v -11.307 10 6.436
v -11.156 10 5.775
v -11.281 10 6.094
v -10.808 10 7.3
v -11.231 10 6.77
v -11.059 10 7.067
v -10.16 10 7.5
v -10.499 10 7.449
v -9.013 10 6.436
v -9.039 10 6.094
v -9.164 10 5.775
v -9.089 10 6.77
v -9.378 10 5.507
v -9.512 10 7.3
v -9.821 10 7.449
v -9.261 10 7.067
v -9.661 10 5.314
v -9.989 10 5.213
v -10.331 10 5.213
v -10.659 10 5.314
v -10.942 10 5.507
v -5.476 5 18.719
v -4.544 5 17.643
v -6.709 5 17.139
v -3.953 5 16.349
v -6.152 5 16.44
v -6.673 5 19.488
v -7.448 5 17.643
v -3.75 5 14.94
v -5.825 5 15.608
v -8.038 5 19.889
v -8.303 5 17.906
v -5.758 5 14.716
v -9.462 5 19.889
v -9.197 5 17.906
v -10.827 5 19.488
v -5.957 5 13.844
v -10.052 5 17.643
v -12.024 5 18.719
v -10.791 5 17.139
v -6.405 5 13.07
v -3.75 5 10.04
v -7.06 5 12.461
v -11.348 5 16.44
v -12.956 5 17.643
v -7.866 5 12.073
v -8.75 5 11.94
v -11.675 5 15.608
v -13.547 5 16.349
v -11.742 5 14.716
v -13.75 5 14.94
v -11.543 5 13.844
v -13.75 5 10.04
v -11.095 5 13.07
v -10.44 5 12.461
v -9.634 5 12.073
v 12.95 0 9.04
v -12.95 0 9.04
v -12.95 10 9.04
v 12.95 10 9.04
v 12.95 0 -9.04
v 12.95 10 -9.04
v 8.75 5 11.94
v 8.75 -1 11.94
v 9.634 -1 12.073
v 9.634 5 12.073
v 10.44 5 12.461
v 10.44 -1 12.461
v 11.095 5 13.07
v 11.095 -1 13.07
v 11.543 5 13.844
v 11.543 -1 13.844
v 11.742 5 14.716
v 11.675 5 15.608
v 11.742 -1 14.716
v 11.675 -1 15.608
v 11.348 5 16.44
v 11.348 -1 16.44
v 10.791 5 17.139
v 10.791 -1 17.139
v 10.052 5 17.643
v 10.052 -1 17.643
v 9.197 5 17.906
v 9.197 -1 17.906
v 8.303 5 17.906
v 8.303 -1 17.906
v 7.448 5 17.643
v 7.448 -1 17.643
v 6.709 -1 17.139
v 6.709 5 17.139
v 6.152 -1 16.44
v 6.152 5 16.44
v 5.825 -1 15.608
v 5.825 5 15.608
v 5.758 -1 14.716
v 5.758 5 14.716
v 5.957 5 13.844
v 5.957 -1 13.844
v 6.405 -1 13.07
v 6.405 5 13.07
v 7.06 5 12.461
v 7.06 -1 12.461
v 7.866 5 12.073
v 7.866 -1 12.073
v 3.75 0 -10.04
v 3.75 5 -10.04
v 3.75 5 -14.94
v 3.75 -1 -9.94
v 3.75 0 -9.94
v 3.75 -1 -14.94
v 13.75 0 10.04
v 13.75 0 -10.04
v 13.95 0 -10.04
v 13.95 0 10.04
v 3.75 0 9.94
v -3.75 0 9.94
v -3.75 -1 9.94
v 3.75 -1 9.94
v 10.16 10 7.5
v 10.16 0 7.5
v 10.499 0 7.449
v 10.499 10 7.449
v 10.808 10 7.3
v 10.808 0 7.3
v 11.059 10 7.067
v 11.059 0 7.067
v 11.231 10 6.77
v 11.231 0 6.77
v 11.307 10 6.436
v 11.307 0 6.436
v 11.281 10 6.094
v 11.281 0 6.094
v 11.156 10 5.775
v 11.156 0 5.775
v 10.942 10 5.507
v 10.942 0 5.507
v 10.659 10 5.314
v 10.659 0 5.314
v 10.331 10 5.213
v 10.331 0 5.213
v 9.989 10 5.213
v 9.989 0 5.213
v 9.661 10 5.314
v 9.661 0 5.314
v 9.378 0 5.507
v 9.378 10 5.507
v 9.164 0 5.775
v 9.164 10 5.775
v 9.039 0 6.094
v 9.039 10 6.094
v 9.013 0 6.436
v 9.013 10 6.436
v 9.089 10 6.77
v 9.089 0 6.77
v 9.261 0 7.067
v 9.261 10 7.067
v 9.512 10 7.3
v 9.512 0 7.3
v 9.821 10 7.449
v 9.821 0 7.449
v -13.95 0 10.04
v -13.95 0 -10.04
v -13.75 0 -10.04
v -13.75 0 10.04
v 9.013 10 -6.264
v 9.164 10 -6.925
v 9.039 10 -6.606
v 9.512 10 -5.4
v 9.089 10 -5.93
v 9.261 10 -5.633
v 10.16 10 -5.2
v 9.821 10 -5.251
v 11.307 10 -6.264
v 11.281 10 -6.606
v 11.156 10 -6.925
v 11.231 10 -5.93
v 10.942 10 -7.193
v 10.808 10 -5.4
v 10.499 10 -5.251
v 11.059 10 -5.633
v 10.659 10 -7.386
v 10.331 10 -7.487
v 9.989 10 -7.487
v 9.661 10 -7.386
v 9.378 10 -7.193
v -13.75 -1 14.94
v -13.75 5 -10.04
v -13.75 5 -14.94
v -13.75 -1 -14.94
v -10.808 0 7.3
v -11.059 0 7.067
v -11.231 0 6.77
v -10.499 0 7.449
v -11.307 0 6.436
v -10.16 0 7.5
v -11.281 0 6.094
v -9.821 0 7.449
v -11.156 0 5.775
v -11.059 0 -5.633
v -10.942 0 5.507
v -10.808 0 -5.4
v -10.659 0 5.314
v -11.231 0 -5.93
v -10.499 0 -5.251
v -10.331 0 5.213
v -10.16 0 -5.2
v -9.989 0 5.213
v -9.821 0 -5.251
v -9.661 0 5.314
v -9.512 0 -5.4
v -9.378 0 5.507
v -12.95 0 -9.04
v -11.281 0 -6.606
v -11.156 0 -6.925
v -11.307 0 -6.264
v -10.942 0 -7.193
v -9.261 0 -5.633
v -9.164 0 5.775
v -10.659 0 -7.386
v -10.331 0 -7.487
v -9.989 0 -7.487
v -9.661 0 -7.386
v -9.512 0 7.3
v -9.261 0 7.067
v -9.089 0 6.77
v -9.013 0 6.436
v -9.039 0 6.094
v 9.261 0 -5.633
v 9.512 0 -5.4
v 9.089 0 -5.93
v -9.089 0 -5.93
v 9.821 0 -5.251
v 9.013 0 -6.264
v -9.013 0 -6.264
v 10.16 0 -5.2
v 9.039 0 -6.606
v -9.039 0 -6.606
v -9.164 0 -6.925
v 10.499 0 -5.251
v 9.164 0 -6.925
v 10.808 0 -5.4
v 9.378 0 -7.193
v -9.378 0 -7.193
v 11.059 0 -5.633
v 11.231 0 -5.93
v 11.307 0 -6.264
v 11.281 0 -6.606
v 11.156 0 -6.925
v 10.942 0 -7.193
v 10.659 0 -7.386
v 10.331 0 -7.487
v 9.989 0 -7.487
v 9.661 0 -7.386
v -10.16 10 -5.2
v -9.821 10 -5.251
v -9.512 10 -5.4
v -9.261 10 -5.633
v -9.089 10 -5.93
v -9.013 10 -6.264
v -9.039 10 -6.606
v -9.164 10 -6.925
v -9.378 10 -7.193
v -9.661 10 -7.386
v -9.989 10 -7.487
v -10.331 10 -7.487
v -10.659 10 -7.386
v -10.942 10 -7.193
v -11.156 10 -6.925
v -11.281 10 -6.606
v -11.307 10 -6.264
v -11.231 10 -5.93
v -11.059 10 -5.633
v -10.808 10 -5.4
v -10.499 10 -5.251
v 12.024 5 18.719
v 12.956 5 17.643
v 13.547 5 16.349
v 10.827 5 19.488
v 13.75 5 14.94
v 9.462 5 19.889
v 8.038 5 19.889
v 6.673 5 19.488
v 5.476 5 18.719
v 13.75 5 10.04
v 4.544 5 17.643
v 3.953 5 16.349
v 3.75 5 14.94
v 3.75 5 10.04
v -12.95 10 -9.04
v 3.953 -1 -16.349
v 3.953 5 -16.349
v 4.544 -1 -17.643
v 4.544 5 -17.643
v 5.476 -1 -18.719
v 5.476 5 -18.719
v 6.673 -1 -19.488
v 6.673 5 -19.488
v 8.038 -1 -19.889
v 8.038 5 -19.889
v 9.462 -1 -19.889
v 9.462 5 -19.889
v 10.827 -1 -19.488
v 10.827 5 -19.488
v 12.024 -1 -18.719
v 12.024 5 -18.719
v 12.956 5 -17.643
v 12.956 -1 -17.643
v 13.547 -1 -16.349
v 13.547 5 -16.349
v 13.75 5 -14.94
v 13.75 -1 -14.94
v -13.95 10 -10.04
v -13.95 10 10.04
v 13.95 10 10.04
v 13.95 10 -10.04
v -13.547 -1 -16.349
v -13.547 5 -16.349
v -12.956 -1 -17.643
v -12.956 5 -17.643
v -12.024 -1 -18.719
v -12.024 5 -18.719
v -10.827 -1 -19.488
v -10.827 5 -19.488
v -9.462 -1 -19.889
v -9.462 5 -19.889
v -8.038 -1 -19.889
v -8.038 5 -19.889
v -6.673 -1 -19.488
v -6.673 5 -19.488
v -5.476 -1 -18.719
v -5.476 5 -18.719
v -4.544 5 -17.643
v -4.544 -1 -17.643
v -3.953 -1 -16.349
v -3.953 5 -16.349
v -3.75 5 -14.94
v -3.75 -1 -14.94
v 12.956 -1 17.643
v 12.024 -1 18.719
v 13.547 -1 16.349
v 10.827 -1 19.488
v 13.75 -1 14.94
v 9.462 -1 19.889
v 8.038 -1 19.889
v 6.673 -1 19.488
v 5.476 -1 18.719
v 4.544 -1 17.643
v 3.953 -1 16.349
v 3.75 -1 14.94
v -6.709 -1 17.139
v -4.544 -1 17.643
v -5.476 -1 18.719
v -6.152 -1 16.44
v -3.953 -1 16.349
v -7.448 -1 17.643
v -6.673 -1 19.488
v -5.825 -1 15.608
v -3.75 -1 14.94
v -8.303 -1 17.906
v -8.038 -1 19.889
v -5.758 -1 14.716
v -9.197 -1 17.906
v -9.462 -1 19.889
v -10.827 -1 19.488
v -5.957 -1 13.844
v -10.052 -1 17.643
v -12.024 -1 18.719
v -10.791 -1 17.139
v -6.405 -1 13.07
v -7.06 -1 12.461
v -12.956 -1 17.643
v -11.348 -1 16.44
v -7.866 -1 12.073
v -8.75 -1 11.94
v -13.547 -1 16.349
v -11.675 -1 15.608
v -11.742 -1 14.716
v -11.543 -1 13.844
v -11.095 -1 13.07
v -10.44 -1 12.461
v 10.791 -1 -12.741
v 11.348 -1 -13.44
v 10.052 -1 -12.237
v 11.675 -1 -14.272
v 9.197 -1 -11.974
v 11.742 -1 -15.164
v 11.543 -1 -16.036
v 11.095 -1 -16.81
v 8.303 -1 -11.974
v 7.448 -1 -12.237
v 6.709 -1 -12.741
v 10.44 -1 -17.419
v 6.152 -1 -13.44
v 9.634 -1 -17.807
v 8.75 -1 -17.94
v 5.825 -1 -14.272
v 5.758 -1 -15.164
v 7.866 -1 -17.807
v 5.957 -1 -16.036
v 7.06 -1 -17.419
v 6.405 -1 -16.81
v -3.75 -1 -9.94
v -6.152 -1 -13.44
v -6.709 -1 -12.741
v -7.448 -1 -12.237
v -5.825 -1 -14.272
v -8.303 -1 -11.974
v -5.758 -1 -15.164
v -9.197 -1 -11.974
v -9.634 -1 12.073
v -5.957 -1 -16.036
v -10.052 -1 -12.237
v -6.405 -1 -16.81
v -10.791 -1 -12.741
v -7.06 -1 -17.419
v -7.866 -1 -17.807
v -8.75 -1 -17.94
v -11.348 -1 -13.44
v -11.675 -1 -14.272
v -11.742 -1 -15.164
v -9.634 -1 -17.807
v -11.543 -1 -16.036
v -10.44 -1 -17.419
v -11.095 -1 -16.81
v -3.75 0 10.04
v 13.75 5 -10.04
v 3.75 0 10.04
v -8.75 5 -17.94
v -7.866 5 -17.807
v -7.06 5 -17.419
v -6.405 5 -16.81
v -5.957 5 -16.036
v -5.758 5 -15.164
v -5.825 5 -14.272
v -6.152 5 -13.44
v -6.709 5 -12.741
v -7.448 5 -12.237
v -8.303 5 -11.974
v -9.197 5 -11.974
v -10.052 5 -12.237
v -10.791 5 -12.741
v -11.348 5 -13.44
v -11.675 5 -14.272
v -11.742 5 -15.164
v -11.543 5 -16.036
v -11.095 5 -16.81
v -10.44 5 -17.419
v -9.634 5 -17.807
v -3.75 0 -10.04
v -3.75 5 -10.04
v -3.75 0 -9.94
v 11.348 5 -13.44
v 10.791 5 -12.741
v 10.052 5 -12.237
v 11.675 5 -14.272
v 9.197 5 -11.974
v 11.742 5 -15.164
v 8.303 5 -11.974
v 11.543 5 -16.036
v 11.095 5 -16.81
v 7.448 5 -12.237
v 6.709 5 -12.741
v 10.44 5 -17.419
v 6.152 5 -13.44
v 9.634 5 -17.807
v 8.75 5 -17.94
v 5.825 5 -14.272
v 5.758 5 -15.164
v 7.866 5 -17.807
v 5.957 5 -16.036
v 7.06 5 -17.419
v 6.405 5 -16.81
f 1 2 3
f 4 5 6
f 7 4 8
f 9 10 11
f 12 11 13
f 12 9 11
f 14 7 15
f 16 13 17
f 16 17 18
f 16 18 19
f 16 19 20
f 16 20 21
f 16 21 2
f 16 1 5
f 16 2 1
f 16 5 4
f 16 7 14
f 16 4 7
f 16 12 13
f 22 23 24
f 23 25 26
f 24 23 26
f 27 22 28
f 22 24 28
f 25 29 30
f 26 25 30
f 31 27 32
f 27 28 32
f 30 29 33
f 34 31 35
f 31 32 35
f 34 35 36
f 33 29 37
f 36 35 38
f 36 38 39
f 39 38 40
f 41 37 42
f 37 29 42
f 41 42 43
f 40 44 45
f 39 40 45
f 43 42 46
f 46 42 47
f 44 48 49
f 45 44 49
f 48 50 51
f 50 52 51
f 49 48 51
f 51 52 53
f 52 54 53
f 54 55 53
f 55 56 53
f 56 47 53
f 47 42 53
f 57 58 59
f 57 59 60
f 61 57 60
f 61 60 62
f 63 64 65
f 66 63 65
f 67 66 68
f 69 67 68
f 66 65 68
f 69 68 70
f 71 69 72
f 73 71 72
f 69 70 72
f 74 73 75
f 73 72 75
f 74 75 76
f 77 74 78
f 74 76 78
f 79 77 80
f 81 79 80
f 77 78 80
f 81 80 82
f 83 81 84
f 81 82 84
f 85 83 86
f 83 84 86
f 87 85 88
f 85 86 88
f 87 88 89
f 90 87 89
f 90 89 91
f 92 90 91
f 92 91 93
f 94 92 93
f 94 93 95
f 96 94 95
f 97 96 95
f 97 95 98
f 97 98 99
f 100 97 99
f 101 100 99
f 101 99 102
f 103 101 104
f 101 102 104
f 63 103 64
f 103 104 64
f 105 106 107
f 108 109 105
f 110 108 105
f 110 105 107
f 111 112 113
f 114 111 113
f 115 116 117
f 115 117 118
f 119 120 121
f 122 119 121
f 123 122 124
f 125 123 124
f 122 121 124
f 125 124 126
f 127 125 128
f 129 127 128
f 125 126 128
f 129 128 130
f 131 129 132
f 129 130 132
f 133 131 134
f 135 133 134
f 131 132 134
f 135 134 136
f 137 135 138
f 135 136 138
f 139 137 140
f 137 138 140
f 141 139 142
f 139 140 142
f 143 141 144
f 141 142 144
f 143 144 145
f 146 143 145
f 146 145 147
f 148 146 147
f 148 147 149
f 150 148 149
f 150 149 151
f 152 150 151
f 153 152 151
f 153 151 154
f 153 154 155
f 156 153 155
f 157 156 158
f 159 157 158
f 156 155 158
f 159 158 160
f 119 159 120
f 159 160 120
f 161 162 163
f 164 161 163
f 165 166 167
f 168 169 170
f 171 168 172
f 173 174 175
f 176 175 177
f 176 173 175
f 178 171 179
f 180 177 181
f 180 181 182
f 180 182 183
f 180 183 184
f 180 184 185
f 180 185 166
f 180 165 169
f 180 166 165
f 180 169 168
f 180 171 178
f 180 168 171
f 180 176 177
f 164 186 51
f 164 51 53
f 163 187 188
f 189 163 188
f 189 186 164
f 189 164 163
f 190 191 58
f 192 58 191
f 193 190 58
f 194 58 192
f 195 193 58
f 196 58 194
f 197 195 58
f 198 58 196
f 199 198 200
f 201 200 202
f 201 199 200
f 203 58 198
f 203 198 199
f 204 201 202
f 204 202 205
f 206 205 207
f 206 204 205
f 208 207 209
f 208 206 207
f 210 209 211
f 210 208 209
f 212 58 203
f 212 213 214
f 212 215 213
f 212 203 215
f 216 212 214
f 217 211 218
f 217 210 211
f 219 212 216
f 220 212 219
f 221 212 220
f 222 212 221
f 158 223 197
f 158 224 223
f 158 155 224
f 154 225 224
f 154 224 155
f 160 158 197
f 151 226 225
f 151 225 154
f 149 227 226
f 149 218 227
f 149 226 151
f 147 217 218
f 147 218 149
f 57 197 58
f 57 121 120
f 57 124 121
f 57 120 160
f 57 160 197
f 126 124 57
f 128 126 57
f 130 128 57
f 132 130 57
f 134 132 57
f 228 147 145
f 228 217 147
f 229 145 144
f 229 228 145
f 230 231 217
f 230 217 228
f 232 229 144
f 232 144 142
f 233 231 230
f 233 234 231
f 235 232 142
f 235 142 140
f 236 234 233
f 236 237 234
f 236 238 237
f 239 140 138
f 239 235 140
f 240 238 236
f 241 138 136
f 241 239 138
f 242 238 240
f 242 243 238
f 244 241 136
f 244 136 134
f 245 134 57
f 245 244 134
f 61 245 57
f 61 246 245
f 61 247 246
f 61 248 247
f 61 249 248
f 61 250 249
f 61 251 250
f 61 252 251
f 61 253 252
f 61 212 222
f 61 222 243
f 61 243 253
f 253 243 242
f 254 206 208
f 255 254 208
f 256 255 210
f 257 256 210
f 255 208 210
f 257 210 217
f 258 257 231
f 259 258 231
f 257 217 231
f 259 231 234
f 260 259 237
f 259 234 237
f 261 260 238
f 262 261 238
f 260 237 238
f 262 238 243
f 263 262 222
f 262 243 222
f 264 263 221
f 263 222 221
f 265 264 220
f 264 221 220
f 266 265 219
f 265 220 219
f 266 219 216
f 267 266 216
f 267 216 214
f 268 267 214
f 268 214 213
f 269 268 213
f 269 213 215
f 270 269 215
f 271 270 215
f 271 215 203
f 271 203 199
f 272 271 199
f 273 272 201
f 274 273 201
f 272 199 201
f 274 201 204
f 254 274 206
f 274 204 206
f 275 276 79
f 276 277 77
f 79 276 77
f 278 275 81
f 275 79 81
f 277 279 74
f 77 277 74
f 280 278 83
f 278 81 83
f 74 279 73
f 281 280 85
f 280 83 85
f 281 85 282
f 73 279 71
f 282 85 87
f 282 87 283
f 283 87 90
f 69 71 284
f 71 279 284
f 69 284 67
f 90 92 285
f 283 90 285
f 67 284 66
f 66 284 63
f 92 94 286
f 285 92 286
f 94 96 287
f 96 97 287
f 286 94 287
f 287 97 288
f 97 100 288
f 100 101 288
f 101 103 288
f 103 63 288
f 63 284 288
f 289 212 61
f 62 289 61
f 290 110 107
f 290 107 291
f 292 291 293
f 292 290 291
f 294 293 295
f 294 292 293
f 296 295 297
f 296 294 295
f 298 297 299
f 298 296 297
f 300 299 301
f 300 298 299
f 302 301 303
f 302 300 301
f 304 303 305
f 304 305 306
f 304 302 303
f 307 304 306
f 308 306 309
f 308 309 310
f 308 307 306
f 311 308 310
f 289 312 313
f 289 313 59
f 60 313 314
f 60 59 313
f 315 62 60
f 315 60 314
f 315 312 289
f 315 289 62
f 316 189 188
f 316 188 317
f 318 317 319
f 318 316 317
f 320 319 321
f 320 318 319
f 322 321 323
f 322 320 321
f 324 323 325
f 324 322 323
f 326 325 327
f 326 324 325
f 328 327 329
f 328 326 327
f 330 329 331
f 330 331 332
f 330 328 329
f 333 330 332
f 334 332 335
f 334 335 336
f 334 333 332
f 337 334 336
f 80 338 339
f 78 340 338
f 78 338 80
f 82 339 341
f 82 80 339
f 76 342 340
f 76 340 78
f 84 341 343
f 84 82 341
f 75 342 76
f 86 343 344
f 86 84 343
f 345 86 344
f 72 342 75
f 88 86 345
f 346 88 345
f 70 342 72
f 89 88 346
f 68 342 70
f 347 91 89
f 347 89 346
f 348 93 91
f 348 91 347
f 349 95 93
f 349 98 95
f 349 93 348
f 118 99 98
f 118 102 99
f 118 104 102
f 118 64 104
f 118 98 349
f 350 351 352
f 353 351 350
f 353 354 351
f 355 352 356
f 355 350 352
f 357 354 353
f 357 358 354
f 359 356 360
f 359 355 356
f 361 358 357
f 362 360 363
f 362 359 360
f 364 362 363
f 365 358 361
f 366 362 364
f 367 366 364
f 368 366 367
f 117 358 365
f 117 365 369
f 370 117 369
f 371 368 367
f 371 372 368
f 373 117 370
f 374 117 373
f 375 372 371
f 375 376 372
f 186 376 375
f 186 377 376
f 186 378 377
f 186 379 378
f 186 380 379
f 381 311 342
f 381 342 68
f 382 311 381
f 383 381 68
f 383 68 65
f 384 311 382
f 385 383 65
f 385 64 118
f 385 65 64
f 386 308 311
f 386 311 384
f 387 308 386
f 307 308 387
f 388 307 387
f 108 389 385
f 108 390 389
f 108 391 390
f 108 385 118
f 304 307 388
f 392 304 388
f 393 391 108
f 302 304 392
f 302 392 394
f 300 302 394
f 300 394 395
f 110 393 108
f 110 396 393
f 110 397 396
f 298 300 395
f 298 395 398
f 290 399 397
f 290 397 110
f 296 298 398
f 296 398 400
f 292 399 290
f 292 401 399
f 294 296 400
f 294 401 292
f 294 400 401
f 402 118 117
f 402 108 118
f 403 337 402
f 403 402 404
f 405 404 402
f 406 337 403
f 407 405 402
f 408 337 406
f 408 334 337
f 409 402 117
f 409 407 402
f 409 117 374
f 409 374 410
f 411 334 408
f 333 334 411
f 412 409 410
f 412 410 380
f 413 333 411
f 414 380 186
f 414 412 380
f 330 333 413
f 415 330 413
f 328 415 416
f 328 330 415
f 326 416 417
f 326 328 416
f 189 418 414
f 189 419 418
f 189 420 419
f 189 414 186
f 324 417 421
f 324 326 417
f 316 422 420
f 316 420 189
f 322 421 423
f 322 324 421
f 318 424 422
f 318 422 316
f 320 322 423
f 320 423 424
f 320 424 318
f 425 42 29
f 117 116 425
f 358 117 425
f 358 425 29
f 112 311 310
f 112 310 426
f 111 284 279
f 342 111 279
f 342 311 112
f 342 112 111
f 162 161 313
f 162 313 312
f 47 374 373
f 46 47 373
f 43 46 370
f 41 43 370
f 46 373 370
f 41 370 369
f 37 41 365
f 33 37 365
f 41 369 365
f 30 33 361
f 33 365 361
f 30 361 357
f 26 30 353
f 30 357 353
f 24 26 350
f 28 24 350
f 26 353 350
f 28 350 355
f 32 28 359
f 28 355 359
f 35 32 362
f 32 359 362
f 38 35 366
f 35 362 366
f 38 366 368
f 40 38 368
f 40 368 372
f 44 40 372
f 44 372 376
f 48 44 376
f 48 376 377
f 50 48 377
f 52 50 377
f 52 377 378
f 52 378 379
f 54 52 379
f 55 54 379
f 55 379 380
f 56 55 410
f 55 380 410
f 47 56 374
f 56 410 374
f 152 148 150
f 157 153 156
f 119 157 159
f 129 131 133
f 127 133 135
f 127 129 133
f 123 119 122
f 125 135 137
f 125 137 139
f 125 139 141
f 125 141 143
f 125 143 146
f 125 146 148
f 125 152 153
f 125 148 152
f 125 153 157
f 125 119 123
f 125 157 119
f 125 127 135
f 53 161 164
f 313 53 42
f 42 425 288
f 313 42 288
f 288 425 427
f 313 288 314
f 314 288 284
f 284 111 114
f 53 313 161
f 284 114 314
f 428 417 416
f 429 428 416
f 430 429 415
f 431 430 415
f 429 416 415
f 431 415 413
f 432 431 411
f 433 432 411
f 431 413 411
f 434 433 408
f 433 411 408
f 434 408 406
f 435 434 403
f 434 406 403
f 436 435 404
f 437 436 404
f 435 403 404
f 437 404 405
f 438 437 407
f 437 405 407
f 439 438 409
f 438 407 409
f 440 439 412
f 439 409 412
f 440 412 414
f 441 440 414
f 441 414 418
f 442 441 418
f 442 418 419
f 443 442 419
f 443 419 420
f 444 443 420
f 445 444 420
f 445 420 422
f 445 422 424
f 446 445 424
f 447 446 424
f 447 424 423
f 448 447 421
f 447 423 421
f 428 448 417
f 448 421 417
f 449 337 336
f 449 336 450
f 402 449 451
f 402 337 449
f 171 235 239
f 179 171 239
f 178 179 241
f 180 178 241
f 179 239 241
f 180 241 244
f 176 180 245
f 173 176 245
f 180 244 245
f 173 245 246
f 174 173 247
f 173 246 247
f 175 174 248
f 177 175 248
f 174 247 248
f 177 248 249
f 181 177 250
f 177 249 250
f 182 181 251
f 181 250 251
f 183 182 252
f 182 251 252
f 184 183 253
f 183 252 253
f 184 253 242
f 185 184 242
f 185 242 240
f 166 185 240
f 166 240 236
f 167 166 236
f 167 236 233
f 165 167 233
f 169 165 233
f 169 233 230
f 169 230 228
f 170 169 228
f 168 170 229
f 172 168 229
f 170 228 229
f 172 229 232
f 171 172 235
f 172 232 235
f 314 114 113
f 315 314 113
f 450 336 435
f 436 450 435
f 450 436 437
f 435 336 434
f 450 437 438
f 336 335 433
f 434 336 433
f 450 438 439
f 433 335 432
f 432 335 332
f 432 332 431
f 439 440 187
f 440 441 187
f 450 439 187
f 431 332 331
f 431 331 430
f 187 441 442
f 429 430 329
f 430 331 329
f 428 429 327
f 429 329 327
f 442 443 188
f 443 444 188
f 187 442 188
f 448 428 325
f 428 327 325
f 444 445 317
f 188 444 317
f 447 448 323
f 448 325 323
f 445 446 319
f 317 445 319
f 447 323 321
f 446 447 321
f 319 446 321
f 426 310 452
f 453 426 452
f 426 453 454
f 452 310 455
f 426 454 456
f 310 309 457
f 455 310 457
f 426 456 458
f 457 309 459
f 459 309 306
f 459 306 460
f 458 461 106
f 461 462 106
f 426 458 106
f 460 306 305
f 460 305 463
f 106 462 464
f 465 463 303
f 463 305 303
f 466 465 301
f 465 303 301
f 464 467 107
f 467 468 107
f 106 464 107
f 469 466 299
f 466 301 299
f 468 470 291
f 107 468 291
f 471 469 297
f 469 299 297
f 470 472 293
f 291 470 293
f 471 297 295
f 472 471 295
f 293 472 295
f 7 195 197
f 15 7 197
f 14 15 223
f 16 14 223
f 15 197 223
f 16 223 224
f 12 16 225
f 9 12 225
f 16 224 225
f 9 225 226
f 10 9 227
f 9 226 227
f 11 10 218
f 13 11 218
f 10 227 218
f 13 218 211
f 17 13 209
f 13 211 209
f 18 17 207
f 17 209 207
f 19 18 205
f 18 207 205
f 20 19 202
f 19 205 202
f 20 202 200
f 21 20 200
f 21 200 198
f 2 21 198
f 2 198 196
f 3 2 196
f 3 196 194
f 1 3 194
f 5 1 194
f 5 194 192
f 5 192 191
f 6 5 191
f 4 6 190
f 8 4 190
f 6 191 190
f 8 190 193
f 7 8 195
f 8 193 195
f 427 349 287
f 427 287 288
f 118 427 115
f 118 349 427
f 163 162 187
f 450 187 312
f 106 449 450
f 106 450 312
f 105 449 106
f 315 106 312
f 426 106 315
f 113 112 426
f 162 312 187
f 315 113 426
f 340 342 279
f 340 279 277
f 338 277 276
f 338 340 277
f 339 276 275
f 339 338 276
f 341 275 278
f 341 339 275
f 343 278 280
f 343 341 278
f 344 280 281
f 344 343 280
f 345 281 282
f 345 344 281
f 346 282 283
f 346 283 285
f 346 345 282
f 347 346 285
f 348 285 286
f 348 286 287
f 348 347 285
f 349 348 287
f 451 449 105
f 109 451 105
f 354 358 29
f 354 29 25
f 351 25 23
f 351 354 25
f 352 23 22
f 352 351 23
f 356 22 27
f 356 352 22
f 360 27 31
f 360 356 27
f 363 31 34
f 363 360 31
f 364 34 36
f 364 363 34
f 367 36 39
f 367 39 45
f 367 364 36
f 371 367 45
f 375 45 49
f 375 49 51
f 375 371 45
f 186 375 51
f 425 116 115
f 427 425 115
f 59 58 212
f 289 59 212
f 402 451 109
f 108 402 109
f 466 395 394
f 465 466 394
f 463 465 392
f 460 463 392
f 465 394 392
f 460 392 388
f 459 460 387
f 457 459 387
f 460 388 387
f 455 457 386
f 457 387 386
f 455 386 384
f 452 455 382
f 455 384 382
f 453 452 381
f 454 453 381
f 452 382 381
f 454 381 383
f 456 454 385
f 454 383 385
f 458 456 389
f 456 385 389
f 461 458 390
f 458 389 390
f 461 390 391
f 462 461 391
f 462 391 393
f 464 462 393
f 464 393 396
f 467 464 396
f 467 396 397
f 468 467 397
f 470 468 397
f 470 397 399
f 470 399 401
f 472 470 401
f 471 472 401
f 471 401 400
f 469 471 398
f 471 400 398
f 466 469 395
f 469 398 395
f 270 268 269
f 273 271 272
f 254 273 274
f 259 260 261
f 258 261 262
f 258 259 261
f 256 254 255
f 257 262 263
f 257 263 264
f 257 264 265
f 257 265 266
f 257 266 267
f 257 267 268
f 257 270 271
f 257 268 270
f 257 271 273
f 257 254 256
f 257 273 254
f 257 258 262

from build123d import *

# Parameters (mm, degrees)
SKETCH1_W           = 27.9
SKETCH1_H           = 20.08
SKETCH1_W_2         = 25.9
SKETCH1_H_2         = 18.08
BOSS_EXTRUDE1_DEPTH = 10
SKETCH3_W           = 27.5
SKETCH3_H           = 19.88
BOSS_EXTRUDE2_DEPTH = 1
SKETCH4_R           = 1.15
BOSS_EXTRUDE3_DEPTH = 10
SKETCH12_R          = 3
BOSS_EXTRUDE6_DEPTH = 6


with BuildPart() as part:
    # Sketch1 → Boss-Extrude1 (new body)
    with BuildSketch(Plane(origin=(0, 0, 0), x_dir=(1, 0, 0), z_dir=(0, 1, 0))):
        Rectangle(SKETCH1_W, SKETCH1_H)
        Rectangle(SKETCH1_W_2, SKETCH1_H_2, mode=Mode.SUBTRACT)
    extrude(amount=BOSS_EXTRUDE1_DEPTH)

    # Sketch3 → Boss-Extrude2 (add)
    with BuildSketch(Plane(origin=(0, 0, 0), x_dir=(1, 0, 0), z_dir=(0, 1, 0))):
        Rectangle(SKETCH3_W, SKETCH3_H)
    extrude(amount=-BOSS_EXTRUDE2_DEPTH)

    # Sketch4 → Boss-Extrude3 (add)
    with BuildSketch(Plane(origin=(0, 0, 0), x_dir=(1, 0, 0), z_dir=(0, 1, 0))):
        with Locations((-10.16, 6.35)):
            Circle(SKETCH4_R)
        with Locations((10.16, 6.35)):
            Circle(SKETCH4_R)
        with Locations((-10.16, -6.35)):
            Circle(SKETCH4_R)
        with Locations((10.16, -6.35)):
            Circle(SKETCH4_R)
    extrude(amount=BOSS_EXTRUDE3_DEPTH)

    # Sketch12 → Boss-Extrude6 (add)
    # profile 1 of 4: a face of its own
    with BuildSketch(Plane(origin=(40.87798925, -1, 20.164210109), x_dir=(-1, 0, 0), z_dir=(0, -1, 0))):
        with BuildLine():
            Line((27.12798925, 35.104210109), (27.12798925, 30.104210109))
            Line((27.12798925, 30.104210109), (37.12798925, 30.104210109))
            Line((37.12798925, 30.104210109), (37.12798925, 35.104210109))
            ThreePointArc((37.12798925, 35.104210109), (32.12798925, 40.104210109), (27.12798925, 35.104210109))
        make_face()
        with Locations((32.12798925, 35.104210109)):
            Circle(SKETCH12_R, mode=Mode.SUBTRACT)
    # profile 2 of 4: a face of its own
    with BuildSketch(Plane(origin=(40.87798925, -1, 20.164210109), x_dir=(-1, 0, 0), z_dir=(0, -1, 0))):
        with BuildLine():
            Line((37.12798925, 5.224210109), (37.12798925, 10.224210109))
            Line((37.12798925, 10.224210109), (27.12798925, 10.224210109))
            Line((27.12798925, 10.224210109), (27.12798925, 5.224210109))
            ThreePointArc((27.12798925, 5.224210109), (32.12798925, 0.224210109), (37.12798925, 5.224210109))
        make_face()
        with Locations((32.12798925, 5.224210109)):
            Circle(SKETCH12_R, mode=Mode.SUBTRACT)
    # profile 3 of 4: a face of its own
    with BuildSketch(Plane(origin=(40.87798925, -1, 20.164210109), x_dir=(-1, 0, 0), z_dir=(0, -1, 0))):
        with BuildLine():
            Line((54.62798925, 5.224210109), (54.62798925, 10.224210109))
            Line((54.62798925, 10.224210109), (44.62798925, 10.224210109))
            Line((44.62798925, 10.224210109), (44.62798925, 5.224210109))
            ThreePointArc((44.62798925, 5.224210109), (49.62798925, 0.224210109), (54.62798925, 5.224210109))
        make_face()
        with Locations((49.62798925, 5.224210109)):
            Circle(SKETCH12_R, mode=Mode.SUBTRACT)
    # profile 4 of 4: a face of its own
    with BuildSketch(Plane(origin=(40.87798925, -1, 20.164210109), x_dir=(-1, 0, 0), z_dir=(0, -1, 0))):
        with BuildLine():
            Line((44.62798925, 35.104210109), (44.62798925, 30.104210109))
            Line((44.62798925, 30.104210109), (54.62798925, 30.104210109))
            Line((54.62798925, 30.104210109), (54.62798925, 35.104210109))
            ThreePointArc((54.62798925, 35.104210109), (49.62798925, 40.104210109), (44.62798925, 35.104210109))
        make_face()
        with Locations((49.62798925, 35.104210109)):
            Circle(SKETCH12_R, mode=Mode.SUBTRACT)
    extrude(amount=-BOSS_EXTRUDE6_DEPTH)


solid = part.part
